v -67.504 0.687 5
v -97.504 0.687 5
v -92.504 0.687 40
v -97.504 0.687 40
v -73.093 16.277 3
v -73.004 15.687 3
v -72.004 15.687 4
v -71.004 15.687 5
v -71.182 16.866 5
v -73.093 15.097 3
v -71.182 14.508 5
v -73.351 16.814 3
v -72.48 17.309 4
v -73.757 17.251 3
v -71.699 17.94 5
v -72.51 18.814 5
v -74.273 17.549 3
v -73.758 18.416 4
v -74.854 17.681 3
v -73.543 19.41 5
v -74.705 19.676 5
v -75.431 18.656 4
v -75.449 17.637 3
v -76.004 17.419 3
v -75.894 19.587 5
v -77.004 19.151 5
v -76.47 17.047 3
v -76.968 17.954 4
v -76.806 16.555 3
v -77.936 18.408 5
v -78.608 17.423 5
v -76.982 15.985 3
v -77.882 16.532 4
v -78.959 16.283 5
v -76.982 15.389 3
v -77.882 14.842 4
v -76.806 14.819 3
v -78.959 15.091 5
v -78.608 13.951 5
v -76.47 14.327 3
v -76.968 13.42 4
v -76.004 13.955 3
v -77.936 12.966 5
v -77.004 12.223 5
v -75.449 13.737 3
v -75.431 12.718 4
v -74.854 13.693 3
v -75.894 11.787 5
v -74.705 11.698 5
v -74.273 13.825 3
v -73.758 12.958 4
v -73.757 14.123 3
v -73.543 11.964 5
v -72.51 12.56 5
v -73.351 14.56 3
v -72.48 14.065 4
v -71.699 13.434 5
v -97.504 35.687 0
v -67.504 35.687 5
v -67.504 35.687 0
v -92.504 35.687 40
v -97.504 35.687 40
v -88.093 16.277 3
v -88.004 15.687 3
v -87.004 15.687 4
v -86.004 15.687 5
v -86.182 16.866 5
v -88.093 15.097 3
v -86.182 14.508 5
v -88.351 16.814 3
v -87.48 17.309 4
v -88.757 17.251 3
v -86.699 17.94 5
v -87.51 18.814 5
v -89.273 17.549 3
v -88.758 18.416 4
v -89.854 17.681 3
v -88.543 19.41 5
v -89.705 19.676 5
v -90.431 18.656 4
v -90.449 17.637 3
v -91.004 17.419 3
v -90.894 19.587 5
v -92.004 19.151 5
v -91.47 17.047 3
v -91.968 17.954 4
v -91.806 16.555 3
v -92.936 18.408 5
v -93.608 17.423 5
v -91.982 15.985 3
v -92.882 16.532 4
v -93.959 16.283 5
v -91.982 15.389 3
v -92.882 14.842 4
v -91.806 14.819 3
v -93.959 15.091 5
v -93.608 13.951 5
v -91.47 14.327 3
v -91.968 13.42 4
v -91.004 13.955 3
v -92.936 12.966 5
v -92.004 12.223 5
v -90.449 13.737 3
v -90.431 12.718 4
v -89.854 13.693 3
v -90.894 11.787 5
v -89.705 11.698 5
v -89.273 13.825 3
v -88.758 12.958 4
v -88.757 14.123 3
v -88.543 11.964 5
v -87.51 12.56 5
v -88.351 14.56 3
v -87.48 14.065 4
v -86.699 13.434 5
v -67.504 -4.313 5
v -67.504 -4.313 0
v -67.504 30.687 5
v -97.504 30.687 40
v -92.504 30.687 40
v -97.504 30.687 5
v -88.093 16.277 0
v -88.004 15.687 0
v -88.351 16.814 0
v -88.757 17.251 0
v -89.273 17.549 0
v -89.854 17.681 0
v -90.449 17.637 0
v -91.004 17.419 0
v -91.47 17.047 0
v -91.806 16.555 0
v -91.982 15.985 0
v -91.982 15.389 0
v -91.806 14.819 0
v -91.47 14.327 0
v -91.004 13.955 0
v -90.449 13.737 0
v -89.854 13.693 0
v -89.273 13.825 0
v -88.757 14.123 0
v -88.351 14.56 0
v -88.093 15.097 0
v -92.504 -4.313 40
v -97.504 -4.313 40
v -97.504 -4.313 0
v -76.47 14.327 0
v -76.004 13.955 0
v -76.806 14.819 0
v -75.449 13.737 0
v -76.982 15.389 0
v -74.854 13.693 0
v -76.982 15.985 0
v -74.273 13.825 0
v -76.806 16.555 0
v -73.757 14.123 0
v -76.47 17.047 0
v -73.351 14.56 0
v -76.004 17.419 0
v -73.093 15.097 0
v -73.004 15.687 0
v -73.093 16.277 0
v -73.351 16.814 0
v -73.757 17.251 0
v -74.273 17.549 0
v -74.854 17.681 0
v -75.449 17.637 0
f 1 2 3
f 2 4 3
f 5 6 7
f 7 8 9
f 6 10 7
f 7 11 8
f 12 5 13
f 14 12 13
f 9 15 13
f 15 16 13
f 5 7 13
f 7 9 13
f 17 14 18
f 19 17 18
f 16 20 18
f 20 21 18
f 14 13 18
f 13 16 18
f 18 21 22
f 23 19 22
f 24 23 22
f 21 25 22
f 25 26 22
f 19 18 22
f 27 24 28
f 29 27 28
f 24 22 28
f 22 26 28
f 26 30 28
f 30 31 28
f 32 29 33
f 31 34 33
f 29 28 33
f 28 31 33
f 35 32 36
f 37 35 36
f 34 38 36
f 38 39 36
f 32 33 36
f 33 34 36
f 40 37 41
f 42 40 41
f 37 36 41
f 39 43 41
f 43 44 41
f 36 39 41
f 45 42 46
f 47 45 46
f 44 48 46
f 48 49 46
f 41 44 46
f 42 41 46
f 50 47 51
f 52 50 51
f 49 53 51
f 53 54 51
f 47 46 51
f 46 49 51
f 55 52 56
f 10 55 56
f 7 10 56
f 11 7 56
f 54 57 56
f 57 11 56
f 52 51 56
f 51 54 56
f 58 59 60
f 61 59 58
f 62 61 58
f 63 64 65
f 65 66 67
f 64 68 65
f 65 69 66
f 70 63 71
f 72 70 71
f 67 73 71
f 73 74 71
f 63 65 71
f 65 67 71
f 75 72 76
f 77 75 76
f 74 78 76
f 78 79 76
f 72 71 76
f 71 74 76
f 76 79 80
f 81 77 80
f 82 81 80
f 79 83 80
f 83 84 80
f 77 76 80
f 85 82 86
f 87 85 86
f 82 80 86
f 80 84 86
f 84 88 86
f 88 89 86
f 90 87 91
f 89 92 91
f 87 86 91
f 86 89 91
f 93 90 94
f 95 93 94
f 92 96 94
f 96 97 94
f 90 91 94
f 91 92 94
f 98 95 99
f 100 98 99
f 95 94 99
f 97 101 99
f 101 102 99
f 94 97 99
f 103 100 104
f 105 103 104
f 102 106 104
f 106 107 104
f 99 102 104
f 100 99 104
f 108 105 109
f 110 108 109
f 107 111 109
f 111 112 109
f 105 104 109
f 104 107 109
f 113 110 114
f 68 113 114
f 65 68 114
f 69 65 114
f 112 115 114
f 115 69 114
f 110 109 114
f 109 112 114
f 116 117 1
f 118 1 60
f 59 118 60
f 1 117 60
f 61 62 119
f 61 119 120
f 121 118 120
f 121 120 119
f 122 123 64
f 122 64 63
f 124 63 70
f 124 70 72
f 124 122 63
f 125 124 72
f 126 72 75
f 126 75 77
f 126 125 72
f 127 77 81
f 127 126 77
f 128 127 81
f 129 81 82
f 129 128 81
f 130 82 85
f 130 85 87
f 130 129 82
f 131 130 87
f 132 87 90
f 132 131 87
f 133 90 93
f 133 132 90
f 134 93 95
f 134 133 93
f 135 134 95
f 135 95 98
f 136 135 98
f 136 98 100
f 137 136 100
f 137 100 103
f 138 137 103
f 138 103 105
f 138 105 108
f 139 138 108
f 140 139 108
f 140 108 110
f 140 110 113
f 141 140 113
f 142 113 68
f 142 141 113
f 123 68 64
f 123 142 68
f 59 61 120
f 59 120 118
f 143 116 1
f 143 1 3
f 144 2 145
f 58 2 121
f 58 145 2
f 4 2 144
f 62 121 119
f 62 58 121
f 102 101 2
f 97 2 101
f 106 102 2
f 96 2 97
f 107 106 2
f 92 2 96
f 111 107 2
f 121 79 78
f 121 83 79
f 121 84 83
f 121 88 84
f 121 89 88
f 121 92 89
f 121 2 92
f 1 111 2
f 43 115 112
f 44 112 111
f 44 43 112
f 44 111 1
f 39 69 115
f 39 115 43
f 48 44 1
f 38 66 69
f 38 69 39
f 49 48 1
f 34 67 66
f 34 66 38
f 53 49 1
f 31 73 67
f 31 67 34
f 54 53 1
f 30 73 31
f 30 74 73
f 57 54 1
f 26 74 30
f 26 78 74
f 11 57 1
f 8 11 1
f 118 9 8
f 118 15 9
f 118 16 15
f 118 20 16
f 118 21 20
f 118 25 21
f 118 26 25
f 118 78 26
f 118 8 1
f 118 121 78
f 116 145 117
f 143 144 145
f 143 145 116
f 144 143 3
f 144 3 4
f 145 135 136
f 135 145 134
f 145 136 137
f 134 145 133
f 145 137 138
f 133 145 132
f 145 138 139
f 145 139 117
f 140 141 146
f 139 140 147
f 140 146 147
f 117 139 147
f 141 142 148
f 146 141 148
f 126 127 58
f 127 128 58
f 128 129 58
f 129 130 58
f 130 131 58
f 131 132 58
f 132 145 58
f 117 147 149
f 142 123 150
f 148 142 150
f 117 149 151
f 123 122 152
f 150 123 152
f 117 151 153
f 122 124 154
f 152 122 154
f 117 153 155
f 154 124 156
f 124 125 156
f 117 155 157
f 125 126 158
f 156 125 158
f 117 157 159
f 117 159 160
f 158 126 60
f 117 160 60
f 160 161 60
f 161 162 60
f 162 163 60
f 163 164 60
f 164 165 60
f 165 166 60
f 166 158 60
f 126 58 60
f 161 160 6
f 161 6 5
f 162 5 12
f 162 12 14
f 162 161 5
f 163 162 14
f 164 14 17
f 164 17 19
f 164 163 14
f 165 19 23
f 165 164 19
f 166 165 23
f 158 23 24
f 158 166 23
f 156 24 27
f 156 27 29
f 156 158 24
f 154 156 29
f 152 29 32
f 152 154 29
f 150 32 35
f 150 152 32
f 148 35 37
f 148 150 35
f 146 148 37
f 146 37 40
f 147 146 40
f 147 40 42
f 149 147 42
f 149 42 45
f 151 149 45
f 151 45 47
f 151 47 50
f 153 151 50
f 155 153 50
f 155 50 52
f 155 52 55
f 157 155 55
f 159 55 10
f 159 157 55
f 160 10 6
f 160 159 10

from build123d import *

# Parameters (mm, degrees)
F0_R     = 2
F1_DEPTH = 5
F3_DEPTH = 5
F5_DEPTH = 5
F6_SIZE  = 2


# Not quite as in the source:
# - a feature names something its author has since deleted; it is built from what else it names


with BuildPart() as f1:
    # F0 (on Top) → F1 (new body)
    with BuildSketch(Plane.XY):
        Polygon((-67.5038768748, 35.6870033689), (-97.5038768748, 35.6870033689), (-97.5038768748, 30.6870033689), (-97.5038768748, 0.6870033689), (-97.5038768748, -4.3129966311), (-67.5038768748, -4.3129966311), align=None)
        with Locations((-90.0038768748, 15.6870033689)):
            Circle(F0_R, mode=Mode.SUBTRACT)
        with Locations((-75.0038768748, 15.6870033689)):
            Circle(F0_R, mode=Mode.SUBTRACT)
    extrude(amount=F1_DEPTH)

    # F2 (on face) → F3 (join)
    with BuildSketch(Plane.XZ.offset(4.3129966311)):
        Polygon((-97.5038768748, 5), (-67.5038768748, 5), (-92.5038768748, 40), (-97.5038768748, 40), align=None)
    extrude(amount=-F3_DEPTH)

    # F4 (on face) → F5 (join)
    with BuildSketch(Plane(origin=(0, 35.6870033689, 0), x_dir=(-1, 0, 0), z_dir=(0, 1, 0))):
        Polygon((92.5038768748, 40), (67.5038768748, 5), (97.5038768748, 5), (97.5038768748, 40), align=None)
    extrude(amount=-F5_DEPTH)

    # F6
    f6_edges = [f1.edges().sort_by_distance(p)[0] for p in [
        (-77.003877, 15.687003, 5),
        (-92.003877, 15.687003, 5),
    ]]
    chamfer(f6_edges, length=F6_SIZE)


solid = f1.part
